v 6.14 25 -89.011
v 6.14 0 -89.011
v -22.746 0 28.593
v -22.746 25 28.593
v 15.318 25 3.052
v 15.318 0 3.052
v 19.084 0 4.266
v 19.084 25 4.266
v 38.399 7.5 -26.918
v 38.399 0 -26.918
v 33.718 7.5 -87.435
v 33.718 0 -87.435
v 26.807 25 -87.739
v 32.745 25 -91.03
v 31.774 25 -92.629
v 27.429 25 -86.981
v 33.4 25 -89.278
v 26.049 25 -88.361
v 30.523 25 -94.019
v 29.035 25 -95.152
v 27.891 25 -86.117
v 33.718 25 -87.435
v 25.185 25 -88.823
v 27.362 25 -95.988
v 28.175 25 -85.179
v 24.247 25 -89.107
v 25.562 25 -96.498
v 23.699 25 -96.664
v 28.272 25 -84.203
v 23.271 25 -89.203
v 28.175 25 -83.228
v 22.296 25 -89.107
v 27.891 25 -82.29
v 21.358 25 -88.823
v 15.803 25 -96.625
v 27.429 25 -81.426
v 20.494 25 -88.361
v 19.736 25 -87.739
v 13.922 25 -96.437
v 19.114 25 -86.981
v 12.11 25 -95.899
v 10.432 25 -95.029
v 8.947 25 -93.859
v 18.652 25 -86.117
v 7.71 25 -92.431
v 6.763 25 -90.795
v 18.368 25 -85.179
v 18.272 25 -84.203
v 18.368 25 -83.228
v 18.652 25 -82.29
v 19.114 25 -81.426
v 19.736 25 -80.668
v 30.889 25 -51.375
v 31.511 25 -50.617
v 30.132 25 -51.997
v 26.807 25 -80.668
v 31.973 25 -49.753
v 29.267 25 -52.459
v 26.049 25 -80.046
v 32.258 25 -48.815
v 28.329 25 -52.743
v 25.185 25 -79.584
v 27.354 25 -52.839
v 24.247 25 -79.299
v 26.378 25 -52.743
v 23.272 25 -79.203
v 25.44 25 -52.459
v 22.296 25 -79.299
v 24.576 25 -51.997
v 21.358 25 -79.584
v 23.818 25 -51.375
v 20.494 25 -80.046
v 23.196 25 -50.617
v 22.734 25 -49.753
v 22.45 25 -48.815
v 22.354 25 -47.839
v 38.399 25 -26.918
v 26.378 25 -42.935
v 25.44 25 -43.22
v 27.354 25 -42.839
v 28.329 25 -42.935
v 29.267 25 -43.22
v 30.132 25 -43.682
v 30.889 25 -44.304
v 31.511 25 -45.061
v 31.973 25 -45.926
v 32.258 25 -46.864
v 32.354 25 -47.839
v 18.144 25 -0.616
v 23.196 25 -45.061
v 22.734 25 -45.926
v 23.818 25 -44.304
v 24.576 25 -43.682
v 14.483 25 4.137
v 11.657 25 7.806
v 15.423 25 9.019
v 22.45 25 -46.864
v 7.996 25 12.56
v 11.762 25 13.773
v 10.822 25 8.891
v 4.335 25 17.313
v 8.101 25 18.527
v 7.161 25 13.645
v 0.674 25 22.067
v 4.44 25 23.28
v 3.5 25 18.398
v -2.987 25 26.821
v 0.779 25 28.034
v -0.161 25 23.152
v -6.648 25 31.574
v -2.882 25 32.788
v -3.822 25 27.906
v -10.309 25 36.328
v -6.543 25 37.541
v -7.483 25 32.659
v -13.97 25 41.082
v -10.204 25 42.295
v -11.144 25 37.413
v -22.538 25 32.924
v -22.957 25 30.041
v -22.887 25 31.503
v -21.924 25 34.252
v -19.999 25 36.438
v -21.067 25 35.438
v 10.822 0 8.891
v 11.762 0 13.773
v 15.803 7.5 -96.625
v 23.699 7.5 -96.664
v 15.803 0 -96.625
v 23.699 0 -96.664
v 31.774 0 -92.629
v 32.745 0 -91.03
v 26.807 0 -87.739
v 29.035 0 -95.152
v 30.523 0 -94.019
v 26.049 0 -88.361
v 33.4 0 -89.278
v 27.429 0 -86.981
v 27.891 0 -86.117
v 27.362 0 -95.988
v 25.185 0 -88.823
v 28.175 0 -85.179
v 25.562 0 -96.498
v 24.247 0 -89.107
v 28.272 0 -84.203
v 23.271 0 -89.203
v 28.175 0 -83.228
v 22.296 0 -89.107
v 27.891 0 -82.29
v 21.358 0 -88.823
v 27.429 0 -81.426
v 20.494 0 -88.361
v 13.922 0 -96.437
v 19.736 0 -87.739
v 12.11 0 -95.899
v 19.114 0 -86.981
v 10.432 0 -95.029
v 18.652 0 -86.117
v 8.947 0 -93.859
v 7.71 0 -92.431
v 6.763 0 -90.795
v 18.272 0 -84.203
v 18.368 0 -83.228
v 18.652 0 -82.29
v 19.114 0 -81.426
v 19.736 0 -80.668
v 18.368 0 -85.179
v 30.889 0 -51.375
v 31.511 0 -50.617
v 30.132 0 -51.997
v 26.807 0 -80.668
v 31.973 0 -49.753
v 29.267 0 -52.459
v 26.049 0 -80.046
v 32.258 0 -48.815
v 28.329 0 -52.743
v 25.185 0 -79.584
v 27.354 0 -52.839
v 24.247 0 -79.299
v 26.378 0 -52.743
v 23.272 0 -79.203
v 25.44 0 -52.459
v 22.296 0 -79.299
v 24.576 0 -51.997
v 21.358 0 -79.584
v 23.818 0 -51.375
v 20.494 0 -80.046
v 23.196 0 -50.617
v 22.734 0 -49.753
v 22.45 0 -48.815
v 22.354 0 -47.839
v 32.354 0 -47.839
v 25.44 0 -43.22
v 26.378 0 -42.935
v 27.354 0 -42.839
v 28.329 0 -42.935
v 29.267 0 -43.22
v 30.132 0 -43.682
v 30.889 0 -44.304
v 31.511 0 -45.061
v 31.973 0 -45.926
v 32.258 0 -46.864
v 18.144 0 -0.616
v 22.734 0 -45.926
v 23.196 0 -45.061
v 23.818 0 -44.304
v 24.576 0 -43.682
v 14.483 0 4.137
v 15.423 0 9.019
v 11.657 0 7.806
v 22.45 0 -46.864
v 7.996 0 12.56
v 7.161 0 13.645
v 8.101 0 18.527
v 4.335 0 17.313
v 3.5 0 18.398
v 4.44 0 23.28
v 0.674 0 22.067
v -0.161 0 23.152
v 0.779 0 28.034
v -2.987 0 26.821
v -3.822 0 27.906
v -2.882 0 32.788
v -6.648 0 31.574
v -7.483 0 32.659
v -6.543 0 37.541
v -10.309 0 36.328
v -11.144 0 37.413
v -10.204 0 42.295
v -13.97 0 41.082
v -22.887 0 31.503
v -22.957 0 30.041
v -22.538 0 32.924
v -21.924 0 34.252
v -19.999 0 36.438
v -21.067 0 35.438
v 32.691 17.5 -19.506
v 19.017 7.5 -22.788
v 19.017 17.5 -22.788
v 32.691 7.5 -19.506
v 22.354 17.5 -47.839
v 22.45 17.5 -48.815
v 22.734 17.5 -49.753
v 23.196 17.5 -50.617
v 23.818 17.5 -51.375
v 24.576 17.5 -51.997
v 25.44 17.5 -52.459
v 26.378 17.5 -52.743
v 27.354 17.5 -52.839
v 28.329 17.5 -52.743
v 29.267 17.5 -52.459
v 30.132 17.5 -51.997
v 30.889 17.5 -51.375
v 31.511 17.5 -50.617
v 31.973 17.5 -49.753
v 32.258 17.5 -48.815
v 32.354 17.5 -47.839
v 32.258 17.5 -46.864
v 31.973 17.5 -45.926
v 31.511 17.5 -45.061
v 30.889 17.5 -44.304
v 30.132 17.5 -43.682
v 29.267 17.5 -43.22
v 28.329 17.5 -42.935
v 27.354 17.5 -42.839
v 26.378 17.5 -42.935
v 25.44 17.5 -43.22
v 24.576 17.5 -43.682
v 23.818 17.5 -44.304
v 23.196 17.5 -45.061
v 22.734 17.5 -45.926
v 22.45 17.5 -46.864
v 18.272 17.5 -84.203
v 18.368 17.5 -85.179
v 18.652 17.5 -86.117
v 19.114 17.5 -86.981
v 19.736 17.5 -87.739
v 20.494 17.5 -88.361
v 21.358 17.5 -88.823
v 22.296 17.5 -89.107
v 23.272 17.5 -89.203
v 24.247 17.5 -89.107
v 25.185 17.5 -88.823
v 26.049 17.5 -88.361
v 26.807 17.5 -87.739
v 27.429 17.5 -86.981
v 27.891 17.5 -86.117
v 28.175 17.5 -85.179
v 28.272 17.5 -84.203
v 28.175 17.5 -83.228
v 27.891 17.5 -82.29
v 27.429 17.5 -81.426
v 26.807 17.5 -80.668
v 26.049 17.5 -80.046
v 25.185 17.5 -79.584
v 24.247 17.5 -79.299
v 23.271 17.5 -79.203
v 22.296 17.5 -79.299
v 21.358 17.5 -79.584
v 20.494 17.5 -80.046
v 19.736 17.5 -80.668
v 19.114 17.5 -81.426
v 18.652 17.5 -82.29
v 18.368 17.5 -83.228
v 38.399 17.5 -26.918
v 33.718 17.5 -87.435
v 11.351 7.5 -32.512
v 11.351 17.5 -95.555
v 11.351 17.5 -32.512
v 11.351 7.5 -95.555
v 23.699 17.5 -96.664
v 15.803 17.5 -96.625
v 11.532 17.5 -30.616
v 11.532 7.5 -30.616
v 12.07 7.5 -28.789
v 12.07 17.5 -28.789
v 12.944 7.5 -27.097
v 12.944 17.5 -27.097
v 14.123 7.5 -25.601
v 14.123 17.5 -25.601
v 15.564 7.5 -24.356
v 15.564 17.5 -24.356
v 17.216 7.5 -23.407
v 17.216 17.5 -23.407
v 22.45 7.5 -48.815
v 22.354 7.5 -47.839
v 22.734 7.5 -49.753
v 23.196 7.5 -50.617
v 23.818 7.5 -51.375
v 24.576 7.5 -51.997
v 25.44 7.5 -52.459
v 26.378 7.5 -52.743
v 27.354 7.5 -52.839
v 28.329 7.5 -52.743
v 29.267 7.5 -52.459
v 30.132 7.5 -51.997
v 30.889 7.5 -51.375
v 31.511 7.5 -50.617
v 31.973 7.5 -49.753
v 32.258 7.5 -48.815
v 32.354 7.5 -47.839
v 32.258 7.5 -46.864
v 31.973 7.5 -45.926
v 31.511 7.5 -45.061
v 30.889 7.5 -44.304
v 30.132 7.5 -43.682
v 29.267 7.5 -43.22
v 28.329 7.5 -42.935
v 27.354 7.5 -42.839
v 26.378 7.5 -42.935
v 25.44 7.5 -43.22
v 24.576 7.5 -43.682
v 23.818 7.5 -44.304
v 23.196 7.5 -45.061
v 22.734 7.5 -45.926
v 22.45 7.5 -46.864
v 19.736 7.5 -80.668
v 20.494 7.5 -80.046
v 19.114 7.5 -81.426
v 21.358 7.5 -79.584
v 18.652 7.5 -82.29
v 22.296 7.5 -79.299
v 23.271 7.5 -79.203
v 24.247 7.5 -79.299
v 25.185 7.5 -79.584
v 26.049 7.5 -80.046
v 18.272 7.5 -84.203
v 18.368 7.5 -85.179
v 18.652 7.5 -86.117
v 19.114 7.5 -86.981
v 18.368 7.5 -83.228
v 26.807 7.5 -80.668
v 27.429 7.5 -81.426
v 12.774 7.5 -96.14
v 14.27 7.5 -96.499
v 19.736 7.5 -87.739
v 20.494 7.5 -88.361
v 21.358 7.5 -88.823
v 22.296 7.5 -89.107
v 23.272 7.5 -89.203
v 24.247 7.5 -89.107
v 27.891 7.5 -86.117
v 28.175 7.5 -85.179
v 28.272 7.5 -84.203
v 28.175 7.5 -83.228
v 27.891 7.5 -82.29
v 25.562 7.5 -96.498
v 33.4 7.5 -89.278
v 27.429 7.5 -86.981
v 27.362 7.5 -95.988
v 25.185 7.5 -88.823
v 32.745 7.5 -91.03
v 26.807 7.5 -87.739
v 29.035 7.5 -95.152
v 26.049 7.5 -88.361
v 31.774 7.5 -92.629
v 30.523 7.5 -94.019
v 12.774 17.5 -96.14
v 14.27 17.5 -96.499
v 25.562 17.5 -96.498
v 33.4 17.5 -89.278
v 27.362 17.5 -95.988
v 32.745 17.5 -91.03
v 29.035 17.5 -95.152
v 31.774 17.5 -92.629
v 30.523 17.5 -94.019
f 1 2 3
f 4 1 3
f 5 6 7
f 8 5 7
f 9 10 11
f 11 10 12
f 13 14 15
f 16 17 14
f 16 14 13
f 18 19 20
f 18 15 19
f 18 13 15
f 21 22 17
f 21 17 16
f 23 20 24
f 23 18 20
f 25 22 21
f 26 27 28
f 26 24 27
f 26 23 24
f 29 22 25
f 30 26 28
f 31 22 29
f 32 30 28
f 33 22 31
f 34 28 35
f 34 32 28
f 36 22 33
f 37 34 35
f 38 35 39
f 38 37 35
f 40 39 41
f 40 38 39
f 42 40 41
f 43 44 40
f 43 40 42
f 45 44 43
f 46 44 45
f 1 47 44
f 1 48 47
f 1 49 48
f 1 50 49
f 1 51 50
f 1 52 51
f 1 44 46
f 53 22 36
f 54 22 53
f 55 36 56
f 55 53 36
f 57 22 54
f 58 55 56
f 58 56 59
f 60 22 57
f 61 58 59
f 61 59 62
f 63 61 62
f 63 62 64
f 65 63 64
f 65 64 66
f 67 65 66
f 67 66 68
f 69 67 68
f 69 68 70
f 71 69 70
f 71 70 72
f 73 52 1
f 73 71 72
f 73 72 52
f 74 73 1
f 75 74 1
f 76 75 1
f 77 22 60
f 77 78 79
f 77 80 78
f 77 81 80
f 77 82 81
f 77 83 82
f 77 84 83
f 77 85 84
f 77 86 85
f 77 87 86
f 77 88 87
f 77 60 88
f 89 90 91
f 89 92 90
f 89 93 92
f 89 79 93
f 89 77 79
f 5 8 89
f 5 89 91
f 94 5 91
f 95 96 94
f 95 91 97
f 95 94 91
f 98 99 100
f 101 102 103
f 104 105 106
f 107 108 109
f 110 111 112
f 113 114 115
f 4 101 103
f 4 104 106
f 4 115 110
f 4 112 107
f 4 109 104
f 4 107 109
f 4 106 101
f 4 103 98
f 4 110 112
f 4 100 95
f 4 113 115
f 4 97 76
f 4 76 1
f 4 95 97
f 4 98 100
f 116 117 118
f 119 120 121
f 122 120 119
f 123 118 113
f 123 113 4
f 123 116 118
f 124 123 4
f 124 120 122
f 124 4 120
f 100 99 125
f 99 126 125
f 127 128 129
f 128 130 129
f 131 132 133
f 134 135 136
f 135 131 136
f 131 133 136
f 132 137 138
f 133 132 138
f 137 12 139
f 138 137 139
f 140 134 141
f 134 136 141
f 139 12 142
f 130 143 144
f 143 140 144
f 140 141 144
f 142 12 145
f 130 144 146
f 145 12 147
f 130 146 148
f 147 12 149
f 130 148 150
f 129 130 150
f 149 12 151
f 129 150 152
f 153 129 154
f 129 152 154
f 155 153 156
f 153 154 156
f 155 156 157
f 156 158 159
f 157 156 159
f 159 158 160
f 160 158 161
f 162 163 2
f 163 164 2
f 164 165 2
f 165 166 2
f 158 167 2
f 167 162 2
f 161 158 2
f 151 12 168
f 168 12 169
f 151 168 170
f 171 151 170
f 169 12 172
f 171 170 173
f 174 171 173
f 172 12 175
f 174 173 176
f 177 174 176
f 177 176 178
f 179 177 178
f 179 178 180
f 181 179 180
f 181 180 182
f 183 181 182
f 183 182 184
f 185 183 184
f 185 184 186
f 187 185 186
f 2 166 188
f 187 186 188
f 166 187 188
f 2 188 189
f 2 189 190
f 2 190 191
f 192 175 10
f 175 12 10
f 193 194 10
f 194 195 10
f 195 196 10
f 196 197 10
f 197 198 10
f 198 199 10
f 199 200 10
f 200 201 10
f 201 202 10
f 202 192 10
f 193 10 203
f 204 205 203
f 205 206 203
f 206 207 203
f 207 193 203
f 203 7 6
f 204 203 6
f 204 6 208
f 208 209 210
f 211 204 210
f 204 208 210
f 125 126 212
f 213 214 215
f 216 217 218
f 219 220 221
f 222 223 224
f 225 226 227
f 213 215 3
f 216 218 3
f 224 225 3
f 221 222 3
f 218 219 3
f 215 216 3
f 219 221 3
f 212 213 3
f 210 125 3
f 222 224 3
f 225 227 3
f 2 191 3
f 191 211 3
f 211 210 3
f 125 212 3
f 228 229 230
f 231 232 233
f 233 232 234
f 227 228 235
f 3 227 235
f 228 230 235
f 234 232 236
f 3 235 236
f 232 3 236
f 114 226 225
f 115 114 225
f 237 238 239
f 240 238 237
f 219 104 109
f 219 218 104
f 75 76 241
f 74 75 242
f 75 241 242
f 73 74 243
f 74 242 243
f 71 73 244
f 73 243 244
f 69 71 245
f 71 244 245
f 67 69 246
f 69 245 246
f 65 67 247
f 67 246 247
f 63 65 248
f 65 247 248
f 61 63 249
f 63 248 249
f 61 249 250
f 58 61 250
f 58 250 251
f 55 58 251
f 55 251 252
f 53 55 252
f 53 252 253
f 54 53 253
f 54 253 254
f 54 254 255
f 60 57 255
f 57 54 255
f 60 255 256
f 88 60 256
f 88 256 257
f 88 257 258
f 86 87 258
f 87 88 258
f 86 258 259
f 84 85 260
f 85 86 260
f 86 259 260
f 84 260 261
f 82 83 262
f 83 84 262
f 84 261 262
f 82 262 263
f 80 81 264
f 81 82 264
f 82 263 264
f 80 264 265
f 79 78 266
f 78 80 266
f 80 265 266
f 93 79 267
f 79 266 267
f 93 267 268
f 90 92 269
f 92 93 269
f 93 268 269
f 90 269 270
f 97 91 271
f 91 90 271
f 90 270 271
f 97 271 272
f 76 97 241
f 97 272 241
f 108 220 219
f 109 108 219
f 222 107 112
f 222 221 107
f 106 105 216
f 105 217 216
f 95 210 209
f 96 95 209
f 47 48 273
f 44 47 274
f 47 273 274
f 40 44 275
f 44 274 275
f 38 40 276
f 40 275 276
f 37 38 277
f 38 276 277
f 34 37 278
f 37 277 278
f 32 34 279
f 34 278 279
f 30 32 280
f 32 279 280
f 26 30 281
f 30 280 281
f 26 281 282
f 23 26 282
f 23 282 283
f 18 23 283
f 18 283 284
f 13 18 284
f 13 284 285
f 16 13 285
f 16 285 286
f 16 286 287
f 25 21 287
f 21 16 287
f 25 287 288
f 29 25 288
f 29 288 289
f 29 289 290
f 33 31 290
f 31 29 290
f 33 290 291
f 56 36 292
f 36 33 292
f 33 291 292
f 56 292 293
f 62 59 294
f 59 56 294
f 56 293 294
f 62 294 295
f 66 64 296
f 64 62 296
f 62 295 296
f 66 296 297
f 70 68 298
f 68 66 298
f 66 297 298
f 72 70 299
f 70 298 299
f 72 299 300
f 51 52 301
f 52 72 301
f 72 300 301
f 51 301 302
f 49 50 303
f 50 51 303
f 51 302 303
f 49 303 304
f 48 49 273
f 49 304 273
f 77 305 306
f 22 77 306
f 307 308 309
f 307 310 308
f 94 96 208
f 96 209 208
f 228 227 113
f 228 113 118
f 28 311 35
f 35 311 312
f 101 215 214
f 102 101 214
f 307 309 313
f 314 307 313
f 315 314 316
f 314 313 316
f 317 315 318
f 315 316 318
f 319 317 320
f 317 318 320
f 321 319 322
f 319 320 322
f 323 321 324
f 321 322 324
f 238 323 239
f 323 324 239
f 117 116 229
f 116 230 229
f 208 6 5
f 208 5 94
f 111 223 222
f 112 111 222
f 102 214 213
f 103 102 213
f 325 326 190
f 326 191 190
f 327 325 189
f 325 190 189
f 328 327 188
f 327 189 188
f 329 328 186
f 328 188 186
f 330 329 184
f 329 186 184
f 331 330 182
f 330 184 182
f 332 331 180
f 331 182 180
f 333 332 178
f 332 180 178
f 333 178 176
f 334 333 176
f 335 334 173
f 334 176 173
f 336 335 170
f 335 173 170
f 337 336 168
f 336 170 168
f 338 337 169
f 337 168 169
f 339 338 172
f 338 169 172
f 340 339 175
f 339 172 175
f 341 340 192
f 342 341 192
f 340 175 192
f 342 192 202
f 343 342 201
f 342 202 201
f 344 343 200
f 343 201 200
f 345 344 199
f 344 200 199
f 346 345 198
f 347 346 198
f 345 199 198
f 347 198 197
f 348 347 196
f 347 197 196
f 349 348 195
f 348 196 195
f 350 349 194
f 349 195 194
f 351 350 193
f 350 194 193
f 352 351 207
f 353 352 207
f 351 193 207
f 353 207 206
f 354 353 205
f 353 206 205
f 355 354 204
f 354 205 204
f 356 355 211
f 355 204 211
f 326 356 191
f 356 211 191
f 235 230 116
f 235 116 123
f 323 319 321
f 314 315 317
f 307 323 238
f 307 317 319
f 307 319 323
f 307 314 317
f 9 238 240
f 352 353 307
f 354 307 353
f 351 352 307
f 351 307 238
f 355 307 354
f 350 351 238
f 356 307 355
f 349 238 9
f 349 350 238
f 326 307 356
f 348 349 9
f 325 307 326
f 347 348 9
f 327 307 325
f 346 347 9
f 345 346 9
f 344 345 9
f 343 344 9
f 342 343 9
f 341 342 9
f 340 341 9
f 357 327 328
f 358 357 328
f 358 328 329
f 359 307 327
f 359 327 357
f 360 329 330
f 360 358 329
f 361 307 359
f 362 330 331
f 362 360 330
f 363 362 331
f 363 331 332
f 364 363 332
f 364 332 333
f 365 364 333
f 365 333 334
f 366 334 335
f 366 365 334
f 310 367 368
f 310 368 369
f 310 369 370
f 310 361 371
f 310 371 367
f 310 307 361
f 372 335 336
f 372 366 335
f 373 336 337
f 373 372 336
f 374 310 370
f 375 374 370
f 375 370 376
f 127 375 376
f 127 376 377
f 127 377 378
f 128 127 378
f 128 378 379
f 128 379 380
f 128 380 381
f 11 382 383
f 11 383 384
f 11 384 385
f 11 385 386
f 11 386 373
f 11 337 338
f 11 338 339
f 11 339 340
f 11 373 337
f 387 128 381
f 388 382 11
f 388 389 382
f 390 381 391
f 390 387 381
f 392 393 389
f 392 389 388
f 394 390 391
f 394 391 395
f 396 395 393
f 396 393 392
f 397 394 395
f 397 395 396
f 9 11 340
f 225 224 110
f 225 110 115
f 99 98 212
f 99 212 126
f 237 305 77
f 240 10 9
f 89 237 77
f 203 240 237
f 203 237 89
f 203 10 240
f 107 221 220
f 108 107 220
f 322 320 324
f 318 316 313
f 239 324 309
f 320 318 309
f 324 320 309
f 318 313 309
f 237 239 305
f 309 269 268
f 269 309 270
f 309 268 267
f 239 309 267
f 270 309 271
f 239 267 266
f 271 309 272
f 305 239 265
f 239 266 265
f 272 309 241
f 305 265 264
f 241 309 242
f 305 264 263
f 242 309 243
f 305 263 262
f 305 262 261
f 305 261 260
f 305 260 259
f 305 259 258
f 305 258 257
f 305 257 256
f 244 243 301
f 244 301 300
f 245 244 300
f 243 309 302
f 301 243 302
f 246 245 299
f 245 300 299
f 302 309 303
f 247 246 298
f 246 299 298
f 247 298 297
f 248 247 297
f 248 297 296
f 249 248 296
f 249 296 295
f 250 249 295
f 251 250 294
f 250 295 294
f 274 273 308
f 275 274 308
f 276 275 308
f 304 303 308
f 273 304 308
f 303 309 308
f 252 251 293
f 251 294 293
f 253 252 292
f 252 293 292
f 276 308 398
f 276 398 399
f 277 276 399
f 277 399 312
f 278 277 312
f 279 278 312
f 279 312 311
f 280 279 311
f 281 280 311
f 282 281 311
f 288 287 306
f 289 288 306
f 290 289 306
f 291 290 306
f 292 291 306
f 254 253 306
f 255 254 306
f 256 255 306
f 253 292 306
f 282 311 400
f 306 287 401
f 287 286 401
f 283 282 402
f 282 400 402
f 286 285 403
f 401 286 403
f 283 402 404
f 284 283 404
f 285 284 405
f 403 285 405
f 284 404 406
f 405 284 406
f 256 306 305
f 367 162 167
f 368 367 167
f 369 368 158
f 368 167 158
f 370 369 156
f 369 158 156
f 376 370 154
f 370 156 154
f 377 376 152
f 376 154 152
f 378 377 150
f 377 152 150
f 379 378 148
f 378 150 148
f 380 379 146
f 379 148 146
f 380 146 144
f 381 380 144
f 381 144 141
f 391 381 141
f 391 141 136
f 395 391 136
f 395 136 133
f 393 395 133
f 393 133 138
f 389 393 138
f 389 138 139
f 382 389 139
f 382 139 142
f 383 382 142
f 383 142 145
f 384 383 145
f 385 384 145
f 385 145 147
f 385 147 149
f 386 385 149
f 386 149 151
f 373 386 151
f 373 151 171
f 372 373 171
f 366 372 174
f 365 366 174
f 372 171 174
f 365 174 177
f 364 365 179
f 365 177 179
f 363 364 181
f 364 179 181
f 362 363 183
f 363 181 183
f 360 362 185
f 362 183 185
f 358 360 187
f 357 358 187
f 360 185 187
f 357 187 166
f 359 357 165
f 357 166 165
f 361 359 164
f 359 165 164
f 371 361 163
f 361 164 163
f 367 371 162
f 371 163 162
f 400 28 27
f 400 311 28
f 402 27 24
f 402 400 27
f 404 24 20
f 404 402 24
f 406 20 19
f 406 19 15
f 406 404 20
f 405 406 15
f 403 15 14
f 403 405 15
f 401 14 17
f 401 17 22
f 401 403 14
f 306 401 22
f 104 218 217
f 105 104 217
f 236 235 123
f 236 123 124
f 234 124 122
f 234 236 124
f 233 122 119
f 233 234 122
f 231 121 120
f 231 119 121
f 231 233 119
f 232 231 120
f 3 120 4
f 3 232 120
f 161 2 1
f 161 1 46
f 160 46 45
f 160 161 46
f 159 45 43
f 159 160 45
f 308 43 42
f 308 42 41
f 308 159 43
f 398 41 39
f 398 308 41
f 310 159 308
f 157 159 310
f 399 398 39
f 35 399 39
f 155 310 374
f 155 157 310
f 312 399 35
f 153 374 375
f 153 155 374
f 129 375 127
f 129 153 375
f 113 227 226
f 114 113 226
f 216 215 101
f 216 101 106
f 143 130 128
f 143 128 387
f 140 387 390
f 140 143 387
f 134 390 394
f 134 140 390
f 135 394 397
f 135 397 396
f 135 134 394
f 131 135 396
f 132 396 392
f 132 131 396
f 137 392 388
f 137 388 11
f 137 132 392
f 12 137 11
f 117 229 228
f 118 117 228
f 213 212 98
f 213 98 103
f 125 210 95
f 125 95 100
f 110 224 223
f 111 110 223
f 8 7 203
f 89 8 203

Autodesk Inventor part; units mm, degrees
ref_plane "YZ Plane" through (0, 0, 0) normal (1, 0, 0) x (0, 1, 0)
ref_plane "XZ Plane" through (0, 0, 0) normal (0, 1, 0) x (-1, 0, 0)
sketch "Sketch1" plane through (0, 0, 0) normal (0, 1, 0) x (-1, 0, 0)
  line L0 (-38.3993, -26.9176) -> (-33.0009, -96.7091)
  line L1 (-33.0009, -96.7091) -> (-8.0012, -96.5869)
  circle A0 centre (-23.2715, -84.2034) radius 5
  circle A1 centre (-27.3538, -47.8392) radius 5
  line L2 (-38.3993, -26.9176) -> (16.6007, -26.9176) construction
  arc A2 (22.7463, 28.593) -> (19.9992, 36.438) centre (15.3555, 30.4084) ccw
  line L3 (-8.0012, -96.5869) -> (22.7463, 28.593)
  line L4 (11.975, 39.0871) -> (13.9695, 41.0816)
  line L5 (13.9695, 41.0816) -> (19.9992, 36.438)
  line L6 (13.9695, 41.0816) -> (16.437, 44.2856)
  line L7 (16.437, 44.2856) -> (13.9695, 41.0816)
  line L8 (13.9695, 41.0816) -> (10.2037, 42.2949)
  line L9 (10.2037, 42.2949) -> (11.1441, 37.4129)
  line L10 (10.3086, 36.328) -> (6.5427, 37.5413)
  line L11 (6.5427, 37.5413) -> (7.4831, 32.6592)
  line L12 (6.6476, 31.5743) -> (2.8817, 32.7876)
  line L13 (2.8817, 32.7876) -> (3.8221, 27.9055)
  line L14 (2.9866, 26.8207) -> (-0.7792, 28.034)
  line L15 (-0.7792, 28.034) -> (0.1612, 23.1519)
  line L16 (-0.6744, 22.067) -> (-4.4402, 23.2803)
  line L17 (-4.4402, 23.2803) -> (-3.4998, 18.3982)
  line L18 (-4.3353, 17.3133) -> (-8.1012, 18.5266)
  line L19 (-8.1012, 18.5266) -> (-7.1608, 13.6446)
  line L20 (-7.9963, 12.5597) -> (-11.7622, 13.773)
  line L21 (-11.7622, 13.773) -> (-10.8218, 8.8909)
  line L22 (-11.6573, 7.806) -> (-15.4231, 9.0193)
  line L23 (-15.4231, 9.0193) -> (-14.4827, 4.1373)
  line L24 (-15.3183, 3.0524) -> (-19.0841, 4.2657)
  line L25 (-19.0841, 4.2657) -> (-18.1437, -0.6164)
  line L26 (10.3086, 36.328) -> (11.1441, 37.4129)
  line L27 (6.6476, 31.5743) -> (7.4831, 32.6592)
  line L28 (2.9866, 26.8207) -> (3.8221, 27.9055)
  line L29 (-0.6744, 22.067) -> (0.1612, 23.1519)
  line L30 (-4.3353, 17.3133) -> (-3.4998, 18.3982)
  line L31 (-7.9963, 12.5597) -> (-7.1608, 13.6446)
  line L32 (-11.6573, 7.806) -> (-10.8218, 8.8909)
  line L33 (-38.3993, -26.9176) -> (-18.1437, -0.6164)
  line L34 (-15.3183, 3.0524) -> (-14.4827, 4.1373)
  point P0 (0, 0)
  dimension "d33" = 10
  dimension "d34" = 10
  dimension "d39" = 6
  dimension "d49" = 70
  dimension "d50" = 25
extrude "Extrusion3" add sketch "Sketch1" along normal blind 25
ref_plane "Work Plane2" through (0, 12.5, 0) normal (0, 1, 0) x (1, 0, 0)
sketch "Sketch4" plane through (0, 12.5, 0) normal (0, 1, 0) x (1, 0, 0)
  line L0 (41.2703, 100.0732) -> (11.3509, 100.0732)
  line L1 (11.3509, 100.0732) -> (11.3509, 24.6286)
  line L2 (11.3509, 24.6286) -> (41.2703, 17.4466)
  line L3 (41.2703, 17.4466) -> (41.2703, 100.0732)
  point P0 (0, 0)
extrude "Extrusion4" cut sketch "Sketch4" along normal mid plane 10
fillet "Fillet5" radius 10 4 edges at (33.0009, 21.25, -96.7091) (33.0009, 3.75, -96.7091) (8.0012, 12.5, -96.5869) (11.3509, 12.5, -24.6286)
properties part number "capit"
